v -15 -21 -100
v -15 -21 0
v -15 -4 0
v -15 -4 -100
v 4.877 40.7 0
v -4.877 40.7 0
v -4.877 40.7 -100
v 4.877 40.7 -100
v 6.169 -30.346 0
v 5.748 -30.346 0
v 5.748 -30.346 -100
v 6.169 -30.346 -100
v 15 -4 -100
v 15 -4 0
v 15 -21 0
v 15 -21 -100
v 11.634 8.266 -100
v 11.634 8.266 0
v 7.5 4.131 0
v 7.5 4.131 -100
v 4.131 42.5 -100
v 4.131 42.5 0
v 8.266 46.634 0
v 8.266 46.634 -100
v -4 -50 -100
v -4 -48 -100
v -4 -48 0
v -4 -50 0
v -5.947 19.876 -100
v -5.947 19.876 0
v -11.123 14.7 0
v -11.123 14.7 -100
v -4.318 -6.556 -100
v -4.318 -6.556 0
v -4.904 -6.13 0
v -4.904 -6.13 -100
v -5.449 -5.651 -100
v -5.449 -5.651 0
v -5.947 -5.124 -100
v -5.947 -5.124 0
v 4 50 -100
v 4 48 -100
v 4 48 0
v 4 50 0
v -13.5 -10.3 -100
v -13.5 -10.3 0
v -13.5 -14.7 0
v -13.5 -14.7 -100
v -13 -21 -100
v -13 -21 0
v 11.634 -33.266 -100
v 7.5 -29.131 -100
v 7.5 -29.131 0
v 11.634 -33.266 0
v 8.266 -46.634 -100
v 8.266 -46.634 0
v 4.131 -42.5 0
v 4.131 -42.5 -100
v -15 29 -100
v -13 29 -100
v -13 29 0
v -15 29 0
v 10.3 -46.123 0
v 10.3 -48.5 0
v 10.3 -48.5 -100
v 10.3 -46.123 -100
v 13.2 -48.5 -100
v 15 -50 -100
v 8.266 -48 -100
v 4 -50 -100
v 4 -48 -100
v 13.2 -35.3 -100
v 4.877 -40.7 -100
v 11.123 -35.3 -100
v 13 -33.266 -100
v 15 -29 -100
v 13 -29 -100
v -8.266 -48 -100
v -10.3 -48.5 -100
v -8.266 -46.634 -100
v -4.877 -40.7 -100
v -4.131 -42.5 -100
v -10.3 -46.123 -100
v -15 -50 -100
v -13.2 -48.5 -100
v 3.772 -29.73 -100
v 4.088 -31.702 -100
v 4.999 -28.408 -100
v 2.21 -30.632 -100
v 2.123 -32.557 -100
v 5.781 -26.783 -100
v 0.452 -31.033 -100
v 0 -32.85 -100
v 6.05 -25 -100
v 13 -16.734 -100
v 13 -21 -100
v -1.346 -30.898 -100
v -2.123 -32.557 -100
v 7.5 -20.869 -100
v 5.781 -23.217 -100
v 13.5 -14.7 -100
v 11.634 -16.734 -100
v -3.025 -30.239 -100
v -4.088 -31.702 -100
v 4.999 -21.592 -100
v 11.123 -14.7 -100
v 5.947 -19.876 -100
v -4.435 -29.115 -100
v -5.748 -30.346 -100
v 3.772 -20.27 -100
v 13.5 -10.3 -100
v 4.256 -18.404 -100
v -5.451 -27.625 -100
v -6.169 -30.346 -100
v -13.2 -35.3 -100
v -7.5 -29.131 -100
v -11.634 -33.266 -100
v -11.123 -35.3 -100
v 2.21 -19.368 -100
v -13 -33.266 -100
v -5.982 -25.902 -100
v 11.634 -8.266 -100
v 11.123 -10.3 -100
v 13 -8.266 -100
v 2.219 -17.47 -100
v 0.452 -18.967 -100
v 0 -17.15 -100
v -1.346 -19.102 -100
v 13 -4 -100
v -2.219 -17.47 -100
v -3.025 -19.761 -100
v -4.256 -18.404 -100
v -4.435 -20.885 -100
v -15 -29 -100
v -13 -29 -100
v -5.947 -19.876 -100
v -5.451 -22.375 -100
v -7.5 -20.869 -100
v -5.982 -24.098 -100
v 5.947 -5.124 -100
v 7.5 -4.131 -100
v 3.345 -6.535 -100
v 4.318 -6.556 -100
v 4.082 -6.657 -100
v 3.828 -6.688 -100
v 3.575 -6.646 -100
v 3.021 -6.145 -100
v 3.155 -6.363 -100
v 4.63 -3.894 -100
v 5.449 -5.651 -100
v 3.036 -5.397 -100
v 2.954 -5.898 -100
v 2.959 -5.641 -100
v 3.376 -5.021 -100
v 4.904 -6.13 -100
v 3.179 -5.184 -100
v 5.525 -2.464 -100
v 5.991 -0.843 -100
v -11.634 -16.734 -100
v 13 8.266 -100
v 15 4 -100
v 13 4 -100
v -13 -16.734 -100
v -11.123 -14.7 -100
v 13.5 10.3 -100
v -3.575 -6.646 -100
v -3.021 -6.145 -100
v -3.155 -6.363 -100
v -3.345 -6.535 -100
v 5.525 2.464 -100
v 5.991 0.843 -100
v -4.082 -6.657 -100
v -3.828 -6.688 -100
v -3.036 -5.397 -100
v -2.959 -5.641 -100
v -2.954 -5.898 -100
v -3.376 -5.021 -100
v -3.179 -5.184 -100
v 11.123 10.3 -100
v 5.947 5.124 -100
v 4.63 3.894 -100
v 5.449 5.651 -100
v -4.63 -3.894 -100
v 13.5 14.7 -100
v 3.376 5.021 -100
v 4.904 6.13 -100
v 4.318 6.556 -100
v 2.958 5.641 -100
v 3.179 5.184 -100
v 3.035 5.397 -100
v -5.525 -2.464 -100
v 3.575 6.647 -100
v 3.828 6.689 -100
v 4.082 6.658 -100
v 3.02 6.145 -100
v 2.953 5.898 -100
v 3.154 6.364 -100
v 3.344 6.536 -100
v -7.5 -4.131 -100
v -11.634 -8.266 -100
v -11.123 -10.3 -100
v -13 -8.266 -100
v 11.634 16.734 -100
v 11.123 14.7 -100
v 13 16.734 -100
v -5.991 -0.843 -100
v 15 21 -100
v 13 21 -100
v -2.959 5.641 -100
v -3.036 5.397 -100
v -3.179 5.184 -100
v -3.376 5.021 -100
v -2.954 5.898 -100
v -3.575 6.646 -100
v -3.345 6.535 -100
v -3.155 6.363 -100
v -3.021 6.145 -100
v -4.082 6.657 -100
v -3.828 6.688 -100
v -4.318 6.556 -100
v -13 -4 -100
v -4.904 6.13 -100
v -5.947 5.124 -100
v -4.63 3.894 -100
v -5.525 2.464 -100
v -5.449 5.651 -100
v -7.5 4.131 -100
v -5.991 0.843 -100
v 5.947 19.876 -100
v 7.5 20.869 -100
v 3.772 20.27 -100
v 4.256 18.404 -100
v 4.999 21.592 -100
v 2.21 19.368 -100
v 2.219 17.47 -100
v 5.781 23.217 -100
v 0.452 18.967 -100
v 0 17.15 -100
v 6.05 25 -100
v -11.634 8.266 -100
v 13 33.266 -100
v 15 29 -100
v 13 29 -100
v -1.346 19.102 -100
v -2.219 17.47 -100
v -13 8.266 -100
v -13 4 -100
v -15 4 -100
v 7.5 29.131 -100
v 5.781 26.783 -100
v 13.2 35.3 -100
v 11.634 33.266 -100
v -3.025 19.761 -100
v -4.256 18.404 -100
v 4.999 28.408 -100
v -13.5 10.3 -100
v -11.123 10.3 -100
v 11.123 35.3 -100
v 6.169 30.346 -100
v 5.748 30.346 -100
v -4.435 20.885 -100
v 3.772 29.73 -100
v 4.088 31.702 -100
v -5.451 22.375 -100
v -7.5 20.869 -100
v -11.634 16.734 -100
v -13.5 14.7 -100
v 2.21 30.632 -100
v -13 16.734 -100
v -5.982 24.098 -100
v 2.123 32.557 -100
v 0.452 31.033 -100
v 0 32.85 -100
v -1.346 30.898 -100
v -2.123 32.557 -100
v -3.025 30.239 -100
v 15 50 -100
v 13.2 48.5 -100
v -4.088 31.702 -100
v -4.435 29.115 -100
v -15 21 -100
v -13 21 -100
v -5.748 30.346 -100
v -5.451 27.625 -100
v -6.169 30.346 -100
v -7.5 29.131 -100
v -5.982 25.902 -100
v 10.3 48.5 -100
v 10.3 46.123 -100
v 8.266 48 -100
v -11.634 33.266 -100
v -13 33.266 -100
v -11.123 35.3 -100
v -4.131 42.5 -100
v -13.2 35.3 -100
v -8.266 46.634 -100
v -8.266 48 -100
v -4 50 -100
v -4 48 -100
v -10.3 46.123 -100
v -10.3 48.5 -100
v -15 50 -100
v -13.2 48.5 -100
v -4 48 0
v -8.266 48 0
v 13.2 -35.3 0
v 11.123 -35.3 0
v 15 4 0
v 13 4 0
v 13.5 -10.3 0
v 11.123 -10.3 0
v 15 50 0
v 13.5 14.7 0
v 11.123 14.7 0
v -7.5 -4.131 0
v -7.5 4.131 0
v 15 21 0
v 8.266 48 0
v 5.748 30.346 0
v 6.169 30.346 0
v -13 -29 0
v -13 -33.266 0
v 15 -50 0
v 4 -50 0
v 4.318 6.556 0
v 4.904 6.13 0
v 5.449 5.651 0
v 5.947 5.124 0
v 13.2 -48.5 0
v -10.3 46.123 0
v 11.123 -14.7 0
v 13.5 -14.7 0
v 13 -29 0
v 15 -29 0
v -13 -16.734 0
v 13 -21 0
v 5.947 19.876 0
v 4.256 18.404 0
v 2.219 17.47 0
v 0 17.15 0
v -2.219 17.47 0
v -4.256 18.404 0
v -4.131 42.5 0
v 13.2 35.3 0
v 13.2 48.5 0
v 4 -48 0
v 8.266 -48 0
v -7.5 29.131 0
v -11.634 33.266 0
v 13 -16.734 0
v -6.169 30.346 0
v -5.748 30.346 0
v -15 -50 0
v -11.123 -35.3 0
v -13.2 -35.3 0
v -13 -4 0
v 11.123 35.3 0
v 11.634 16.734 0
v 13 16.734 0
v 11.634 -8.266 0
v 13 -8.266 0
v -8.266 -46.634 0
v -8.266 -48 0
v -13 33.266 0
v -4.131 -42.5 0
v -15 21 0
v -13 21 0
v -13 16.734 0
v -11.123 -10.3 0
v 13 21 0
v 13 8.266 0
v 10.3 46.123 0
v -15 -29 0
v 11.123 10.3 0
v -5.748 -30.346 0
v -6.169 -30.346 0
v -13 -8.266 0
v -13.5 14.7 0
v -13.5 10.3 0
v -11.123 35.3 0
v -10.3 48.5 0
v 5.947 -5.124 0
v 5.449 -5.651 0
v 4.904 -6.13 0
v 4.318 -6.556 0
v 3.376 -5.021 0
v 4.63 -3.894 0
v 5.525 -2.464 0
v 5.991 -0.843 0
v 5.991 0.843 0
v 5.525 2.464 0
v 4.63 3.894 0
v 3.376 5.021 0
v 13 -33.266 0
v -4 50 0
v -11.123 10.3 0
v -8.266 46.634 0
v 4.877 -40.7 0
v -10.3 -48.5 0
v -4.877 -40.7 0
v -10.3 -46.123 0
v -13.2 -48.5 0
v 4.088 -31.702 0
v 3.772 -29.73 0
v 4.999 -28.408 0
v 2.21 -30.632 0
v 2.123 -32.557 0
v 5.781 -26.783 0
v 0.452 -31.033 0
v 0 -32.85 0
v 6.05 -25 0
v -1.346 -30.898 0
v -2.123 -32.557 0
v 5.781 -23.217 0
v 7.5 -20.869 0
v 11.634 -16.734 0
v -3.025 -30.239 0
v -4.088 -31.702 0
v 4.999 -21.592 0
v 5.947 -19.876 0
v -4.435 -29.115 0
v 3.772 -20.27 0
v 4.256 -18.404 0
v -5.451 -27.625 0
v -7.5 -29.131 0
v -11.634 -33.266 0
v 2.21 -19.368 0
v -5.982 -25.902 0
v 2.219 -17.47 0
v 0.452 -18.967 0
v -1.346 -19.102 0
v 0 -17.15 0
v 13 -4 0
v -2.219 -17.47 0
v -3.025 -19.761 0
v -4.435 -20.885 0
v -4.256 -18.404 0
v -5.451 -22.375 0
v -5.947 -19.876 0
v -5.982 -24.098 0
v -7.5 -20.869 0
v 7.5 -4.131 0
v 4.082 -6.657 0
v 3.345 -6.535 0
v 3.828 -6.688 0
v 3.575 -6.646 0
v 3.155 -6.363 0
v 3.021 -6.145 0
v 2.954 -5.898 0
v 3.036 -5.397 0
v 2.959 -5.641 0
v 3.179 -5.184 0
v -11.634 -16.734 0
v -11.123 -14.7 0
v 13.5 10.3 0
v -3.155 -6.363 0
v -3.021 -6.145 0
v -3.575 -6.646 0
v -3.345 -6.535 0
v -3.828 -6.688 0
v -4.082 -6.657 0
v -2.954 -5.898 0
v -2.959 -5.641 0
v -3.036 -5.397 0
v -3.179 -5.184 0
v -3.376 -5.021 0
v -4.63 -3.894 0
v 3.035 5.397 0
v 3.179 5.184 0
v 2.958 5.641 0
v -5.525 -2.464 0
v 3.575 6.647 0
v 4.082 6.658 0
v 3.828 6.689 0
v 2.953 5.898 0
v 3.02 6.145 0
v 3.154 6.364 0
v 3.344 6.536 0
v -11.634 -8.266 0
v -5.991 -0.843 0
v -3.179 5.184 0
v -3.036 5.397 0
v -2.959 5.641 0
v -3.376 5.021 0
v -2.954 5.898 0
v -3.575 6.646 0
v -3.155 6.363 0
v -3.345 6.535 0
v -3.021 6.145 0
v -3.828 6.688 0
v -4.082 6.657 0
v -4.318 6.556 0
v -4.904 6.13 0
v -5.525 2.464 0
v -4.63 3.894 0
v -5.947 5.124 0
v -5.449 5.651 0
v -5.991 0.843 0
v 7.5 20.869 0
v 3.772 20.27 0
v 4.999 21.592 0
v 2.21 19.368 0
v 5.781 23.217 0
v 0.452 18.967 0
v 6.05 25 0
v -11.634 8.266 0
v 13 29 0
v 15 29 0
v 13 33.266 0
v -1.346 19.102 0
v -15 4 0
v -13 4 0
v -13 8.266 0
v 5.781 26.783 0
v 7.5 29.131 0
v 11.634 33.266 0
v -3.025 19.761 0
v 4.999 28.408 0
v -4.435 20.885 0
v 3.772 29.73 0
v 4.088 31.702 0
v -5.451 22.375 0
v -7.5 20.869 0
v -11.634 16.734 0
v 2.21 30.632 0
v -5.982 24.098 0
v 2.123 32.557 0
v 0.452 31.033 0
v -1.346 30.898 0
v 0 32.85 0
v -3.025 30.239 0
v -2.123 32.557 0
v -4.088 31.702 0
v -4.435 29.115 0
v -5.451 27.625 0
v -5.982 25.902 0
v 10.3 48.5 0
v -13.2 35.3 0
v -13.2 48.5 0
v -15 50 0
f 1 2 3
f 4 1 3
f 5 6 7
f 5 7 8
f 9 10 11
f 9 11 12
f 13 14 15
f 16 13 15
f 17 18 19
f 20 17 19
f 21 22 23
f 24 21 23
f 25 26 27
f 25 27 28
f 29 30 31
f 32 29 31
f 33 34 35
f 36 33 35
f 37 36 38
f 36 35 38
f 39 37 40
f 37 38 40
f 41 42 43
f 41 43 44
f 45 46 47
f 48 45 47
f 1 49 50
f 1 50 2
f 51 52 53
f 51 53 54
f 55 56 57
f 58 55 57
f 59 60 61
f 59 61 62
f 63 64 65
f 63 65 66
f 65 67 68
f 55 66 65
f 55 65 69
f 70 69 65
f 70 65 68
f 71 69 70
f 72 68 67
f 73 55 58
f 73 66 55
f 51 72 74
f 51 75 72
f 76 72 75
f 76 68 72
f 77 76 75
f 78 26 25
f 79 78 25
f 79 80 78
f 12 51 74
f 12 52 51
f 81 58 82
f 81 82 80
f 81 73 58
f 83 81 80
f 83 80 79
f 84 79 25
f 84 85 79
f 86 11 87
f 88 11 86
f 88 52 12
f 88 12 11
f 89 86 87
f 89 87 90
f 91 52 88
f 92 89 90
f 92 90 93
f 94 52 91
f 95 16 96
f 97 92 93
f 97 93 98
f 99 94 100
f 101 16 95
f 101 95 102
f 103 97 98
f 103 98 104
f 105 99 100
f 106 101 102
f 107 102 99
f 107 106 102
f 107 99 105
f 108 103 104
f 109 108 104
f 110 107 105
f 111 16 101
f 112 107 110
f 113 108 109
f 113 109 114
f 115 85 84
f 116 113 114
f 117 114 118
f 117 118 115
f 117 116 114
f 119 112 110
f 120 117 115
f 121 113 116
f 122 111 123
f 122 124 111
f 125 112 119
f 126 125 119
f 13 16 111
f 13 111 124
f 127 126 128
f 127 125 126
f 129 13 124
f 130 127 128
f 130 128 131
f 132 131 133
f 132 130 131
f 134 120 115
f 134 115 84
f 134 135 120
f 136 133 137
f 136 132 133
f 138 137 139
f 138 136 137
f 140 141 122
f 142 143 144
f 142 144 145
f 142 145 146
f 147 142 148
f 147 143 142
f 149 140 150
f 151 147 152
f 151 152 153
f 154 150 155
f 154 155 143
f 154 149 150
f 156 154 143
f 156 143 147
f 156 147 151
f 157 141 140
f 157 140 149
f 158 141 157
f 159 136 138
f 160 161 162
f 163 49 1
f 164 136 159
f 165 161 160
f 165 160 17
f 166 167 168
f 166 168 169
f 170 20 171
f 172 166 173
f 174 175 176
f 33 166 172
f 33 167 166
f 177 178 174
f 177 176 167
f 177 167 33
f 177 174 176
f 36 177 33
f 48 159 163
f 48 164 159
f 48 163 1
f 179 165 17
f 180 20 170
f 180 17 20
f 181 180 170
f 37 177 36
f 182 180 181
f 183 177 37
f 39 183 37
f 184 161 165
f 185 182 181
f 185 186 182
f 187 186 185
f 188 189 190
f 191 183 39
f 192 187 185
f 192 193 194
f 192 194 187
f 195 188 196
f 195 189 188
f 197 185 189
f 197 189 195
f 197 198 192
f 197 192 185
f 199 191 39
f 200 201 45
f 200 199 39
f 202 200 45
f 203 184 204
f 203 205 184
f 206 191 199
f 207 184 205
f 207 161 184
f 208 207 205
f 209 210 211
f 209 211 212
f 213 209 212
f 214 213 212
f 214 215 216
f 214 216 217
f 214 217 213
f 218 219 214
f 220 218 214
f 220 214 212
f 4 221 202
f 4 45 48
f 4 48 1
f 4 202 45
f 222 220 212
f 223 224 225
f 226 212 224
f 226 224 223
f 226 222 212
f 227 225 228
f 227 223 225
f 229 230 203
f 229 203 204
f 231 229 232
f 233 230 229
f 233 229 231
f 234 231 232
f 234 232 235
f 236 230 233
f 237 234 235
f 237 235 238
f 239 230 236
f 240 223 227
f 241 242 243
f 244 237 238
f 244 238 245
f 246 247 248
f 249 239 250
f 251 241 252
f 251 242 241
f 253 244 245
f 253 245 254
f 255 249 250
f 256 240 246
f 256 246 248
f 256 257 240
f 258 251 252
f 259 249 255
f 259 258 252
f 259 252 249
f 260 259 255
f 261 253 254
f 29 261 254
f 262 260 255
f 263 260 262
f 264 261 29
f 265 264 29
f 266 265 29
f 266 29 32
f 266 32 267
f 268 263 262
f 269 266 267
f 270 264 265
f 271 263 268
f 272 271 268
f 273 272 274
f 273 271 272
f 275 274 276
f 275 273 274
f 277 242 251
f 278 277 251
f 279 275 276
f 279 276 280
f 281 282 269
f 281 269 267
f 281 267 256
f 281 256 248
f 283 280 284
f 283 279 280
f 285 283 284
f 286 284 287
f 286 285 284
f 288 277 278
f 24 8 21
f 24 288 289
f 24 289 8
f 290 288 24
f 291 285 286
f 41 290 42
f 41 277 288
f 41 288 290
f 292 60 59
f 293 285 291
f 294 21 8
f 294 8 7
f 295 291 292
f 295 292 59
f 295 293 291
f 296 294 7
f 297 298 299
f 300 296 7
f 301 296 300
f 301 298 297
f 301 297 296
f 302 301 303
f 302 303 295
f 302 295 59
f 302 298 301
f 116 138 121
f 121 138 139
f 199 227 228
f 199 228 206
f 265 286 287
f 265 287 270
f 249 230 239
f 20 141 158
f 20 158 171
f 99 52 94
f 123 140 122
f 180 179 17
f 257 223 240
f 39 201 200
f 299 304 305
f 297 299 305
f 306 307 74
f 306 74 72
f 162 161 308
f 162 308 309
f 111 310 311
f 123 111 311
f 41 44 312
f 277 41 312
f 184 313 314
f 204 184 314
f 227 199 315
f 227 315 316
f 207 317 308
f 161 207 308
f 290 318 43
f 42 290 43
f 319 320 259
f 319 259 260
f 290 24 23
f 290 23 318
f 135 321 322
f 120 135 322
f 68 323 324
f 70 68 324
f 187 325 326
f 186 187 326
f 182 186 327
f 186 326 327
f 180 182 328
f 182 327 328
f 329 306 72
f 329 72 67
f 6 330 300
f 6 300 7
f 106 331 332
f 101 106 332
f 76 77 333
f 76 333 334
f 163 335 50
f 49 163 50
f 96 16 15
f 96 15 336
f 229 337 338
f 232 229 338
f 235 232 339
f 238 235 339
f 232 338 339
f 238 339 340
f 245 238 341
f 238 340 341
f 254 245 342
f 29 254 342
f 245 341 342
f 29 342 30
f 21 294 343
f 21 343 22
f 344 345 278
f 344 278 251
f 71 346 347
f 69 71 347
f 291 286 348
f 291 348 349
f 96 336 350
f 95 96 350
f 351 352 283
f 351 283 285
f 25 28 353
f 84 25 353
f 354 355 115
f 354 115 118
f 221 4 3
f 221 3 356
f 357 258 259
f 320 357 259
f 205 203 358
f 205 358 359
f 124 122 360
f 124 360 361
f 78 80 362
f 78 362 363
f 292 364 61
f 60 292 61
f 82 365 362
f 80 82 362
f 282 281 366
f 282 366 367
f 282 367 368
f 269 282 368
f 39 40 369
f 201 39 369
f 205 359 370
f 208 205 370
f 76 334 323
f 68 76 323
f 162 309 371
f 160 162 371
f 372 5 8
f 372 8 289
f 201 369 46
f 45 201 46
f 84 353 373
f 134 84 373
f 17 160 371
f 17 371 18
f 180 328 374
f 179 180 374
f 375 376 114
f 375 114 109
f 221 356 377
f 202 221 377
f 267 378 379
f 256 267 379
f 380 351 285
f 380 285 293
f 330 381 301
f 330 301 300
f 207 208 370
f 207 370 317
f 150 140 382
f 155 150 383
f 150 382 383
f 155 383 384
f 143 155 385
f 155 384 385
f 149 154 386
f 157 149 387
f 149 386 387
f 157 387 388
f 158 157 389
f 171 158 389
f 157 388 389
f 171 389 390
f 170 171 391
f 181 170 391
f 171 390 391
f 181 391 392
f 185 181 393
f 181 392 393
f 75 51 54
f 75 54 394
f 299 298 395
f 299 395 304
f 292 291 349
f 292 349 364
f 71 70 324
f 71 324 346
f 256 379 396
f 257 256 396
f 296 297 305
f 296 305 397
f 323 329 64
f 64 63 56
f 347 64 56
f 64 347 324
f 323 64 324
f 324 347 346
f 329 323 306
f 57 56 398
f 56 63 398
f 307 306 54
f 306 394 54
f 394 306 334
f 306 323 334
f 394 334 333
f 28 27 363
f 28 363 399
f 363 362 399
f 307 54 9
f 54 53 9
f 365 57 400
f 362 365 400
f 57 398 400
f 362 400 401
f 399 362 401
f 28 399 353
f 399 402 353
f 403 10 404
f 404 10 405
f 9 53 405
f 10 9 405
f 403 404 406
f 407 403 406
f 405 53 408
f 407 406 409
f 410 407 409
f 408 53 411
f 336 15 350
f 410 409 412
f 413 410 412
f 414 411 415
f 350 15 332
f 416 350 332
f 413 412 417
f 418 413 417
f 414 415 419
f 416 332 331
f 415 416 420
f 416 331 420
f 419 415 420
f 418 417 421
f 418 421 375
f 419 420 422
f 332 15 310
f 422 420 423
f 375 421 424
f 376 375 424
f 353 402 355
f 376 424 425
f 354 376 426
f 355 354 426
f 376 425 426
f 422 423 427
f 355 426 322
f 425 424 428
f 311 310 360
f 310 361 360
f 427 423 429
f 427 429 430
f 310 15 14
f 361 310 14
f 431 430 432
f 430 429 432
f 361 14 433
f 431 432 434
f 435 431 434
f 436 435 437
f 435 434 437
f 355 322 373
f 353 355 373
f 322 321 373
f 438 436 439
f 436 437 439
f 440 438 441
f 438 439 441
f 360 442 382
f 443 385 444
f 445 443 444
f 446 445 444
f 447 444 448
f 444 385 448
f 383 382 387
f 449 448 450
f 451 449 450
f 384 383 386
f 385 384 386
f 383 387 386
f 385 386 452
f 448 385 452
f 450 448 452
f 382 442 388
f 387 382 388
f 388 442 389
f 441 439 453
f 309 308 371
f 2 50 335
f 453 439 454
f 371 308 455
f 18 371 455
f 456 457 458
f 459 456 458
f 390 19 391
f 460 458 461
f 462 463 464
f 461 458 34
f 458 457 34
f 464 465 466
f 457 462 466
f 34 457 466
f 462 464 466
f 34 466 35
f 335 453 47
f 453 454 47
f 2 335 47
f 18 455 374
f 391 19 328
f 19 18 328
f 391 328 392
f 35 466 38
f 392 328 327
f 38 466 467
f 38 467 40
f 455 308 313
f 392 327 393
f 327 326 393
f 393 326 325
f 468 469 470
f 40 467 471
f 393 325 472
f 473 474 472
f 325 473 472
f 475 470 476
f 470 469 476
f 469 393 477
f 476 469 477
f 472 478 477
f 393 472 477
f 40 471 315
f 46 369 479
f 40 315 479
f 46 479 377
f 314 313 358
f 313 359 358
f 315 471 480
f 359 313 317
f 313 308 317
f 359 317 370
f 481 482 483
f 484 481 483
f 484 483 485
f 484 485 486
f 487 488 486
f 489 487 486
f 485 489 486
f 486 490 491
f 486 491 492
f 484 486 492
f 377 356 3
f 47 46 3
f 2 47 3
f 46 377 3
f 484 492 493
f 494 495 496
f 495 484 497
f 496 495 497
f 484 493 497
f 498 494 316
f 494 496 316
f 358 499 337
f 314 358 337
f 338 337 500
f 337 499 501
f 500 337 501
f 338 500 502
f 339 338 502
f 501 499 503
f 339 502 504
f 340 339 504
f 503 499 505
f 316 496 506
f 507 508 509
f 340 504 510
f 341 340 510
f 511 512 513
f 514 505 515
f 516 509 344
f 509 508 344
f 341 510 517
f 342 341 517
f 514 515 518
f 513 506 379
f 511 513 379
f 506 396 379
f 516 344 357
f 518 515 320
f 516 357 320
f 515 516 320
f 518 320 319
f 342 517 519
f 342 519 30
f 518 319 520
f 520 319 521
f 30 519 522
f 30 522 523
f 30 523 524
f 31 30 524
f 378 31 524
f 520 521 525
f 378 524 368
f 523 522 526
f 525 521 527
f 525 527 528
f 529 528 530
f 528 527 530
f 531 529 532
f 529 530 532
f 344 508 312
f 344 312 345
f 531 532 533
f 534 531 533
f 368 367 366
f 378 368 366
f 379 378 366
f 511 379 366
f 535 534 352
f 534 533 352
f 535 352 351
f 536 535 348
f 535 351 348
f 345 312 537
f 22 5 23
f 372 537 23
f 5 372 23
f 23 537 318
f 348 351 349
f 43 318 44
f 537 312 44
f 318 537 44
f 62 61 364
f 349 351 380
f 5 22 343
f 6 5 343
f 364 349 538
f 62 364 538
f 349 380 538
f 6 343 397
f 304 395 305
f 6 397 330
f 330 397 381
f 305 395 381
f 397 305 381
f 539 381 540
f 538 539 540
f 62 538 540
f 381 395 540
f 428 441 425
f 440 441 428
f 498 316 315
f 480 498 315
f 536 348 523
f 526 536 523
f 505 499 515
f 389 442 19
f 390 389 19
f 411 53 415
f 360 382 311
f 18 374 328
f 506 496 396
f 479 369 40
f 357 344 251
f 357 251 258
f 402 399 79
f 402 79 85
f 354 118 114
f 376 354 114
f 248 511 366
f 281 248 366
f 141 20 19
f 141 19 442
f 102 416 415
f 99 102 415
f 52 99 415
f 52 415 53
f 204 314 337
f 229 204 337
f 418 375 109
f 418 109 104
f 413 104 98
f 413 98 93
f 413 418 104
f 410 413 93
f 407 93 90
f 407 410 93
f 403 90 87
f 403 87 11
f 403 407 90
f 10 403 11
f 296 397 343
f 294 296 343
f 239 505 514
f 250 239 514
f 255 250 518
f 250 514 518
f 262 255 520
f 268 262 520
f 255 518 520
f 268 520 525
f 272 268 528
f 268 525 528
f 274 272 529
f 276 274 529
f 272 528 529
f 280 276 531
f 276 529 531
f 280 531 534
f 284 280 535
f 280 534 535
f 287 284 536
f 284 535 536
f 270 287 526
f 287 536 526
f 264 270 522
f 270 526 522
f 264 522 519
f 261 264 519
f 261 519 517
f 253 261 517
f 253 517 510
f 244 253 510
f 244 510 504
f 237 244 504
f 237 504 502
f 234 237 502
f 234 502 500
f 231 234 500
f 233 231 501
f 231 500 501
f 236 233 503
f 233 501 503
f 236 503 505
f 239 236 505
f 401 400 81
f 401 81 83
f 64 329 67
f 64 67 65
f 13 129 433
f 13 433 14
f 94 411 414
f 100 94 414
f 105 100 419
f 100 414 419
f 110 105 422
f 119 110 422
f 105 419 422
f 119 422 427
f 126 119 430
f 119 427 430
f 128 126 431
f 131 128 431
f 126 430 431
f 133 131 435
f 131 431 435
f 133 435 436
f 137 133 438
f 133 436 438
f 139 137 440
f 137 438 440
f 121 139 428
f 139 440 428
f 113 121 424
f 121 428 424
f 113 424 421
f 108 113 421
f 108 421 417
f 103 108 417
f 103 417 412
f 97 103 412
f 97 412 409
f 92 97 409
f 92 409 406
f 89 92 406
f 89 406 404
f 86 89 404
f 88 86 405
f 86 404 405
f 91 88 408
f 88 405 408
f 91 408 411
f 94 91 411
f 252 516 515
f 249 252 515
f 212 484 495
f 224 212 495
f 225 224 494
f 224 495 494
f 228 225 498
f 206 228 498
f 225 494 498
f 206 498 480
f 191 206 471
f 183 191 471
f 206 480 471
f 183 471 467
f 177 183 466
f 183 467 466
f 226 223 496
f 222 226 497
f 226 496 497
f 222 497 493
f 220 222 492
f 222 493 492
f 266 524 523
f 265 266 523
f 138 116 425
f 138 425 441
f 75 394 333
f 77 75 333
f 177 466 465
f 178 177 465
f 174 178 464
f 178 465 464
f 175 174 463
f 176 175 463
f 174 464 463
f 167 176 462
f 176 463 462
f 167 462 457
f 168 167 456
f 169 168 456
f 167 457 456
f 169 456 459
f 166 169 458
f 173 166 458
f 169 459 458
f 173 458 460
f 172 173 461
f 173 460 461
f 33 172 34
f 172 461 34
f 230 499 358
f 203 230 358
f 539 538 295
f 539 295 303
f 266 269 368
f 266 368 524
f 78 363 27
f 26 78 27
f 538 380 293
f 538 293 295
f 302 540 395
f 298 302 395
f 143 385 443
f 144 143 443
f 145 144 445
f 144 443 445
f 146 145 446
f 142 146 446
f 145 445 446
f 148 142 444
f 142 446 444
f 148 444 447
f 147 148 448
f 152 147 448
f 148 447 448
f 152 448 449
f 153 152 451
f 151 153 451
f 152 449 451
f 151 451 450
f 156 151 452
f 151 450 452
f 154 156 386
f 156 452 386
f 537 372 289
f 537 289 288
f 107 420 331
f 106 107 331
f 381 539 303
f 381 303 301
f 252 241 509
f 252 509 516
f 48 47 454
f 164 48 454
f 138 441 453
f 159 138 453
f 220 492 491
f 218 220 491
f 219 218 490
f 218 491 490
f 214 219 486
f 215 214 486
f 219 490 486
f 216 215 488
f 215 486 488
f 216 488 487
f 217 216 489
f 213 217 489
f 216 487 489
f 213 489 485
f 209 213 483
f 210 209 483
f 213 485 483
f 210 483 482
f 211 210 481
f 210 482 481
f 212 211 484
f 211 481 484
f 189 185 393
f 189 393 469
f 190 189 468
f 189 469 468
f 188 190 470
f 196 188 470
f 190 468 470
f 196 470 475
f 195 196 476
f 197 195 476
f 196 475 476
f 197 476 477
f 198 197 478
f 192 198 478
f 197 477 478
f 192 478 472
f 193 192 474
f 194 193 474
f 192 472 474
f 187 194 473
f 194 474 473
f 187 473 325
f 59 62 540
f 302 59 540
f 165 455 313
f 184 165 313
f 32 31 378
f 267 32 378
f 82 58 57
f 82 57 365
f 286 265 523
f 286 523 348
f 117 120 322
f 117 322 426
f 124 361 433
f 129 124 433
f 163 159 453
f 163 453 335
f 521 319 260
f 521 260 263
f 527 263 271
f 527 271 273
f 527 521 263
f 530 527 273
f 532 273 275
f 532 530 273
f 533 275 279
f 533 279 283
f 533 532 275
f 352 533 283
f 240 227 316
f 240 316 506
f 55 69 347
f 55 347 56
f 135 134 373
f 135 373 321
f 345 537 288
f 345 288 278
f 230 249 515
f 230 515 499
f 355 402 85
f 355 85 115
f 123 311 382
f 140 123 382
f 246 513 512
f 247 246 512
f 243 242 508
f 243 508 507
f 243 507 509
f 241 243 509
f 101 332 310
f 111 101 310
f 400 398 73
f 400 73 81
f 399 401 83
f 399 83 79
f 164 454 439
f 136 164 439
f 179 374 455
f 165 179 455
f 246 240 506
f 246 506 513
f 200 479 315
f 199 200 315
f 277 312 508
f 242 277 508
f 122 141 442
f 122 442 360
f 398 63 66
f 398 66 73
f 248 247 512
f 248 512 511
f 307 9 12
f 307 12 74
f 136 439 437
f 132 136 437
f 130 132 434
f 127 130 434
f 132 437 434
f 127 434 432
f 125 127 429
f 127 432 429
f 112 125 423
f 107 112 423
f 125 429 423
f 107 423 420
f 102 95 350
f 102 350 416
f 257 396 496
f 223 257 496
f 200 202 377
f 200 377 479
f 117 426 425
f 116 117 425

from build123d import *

# Parameters (mm, degrees)
MB1_2_R        = 6.049999109
MB1_2_R_2      = 6.050000891
EXTRUDE1_DEPTH = 100


with BuildPart() as part:
    # MB1-2 → Extrude1 (new body)
    with BuildSketch(Plane.XY):
        Polygon((-13, -33.265685), (-11.634315, -33.265685), (-7.5, -29.131371165), (-7.5, -20.868628835), (-11.634315, -16.734315), (-13, -16.734315), (-13, -21), (-15, -21), (-15, -4), (-13, -4), (-13, -8.265685), (-11.634315, -8.265685), (-7.5, -4.131371165), (-7.5, 4.131371165), (-11.634315, 8.265685), (-13, 8.265685), (-13, 4), (-15, 4), (-15, 21), (-13, 21), (-13, 16.734315), (-11.634315, 16.734315), (-7.5, 20.868628835), (-7.5, 29.131371165), (-11.634315, 33.265685), (-13, 33.265685), (-13, 29), (-15, 29), (-15, 50), (-4, 50), (-4, 48), (-8.265685, 48), (-8.265685, 46.634315), (-4.131371165, 42.5), (4.131371165, 42.5), (8.265685, 46.634315), (8.265685, 48), (4, 48), (4, 50), (15, 50), (15, 29), (13, 29), (13, 33.265685), (11.634315, 33.265685), (7.5, 29.131371165), (7.5, 20.868628835), (11.634315, 16.734315), (13, 16.734315), (13, 21), (15, 21), (15, 4), (13, 4), (13, 8.265685), (11.634315, 8.265685), (7.5, 4.131371165), (7.5, -4.131371165), (11.634315, -8.265685), (13, -8.265685), (13, -4), (15, -4), (15, -21), (13, -21), (13, -16.734315), (11.634315, -16.734315), (7.5, -20.868628835), (7.5, -29.131371165), (11.634315, -33.265685), (13, -33.265685), (13, -29), (15, -29), (15, -50), (4, -50), (4, -48), (8.265685, -48), (8.265685, -46.634315), (4.131371165, -42.5), (-4.131371165, -42.5), (-8.265685, -46.634315), (-8.265685, -48), (-4, -48), (-4, -50), (-15, -50), (-15, -29), (-13, -29), align=None)
        with Locations((0, -24.999996952)):
            Circle(MB1_2_R, mode=Mode.SUBTRACT)
        with Locations((0, 24.999996952)):
            Circle(MB1_2_R_2, mode=Mode.SUBTRACT)
        with BuildLine():
            Line((5.74819726, -30.346094347), (6.169137939, -30.346093939))
            Line((6.169137939, -30.346093939), (11.123044, -35.3))
            Line((11.123044, -35.3), (13.2, -35.3))
            Line((13.2, -35.3), (13.2, -48.5))
            Line((13.2, -48.5), (10.3, -48.5))
            Line((10.3, -48.5), (10.3, -46.123043785))
            Line((10.3, -46.123043785), (4.876954686, -40.7))
            Line((4.876954686, -40.7), (-4.876954686, -40.7))
            Line((-4.876954686, -40.7), (-10.3, -46.123043785))
            Line((-10.3, -46.123043785), (-10.3, -48.5))
            Line((-10.3, -48.5), (-13.2, -48.5))
            Line((-13.2, -48.5), (-13.2, -35.3))
            Line((-13.2, -35.3), (-11.123044, -35.3))
            Line((-11.123044, -35.3), (-6.169138347, -30.346094347))
            Line((-6.169138347, -30.346094347), (-5.74819688, -30.346094756))
            ThreePointArc((-5.74819688, -30.346094756), (2.79e-07, -32.849998806), (5.74819726, -30.346094347))
        make_face(mode=Mode.SUBTRACT)
        with BuildLine():
            Line((6.169138347, 30.346094347), (5.74819688, 30.346094756))
            ThreePointArc((5.74819688, 30.346094756), (-2.79e-07, 32.849998806), (-5.74819726, 30.346094347))
            Line((-5.74819726, 30.346094347), (-6.169137939, 30.346093939))
            Line((-6.169137939, 30.346093939), (-11.123044, 35.3))
            Line((-11.123044, 35.3), (-13.2, 35.3))
            Line((-13.2, 35.3), (-13.2, 48.5))
            Line((-13.2, 48.5), (-10.3, 48.5))
            Line((-10.3, 48.5), (-10.3, 46.123043785))
            Line((-10.3, 46.123043785), (-4.876954686, 40.7))
            Line((-4.876954686, 40.7), (4.876954686, 40.7))
            Line((4.876954686, 40.7), (10.3, 46.123043785))
            Line((10.3, 46.123043785), (10.3, 48.5))
            Line((10.3, 48.5), (13.2, 48.5))
            Line((13.2, 48.5), (13.2, 35.3))
            Line((13.2, 35.3), (11.123044, 35.3))
            Line((11.123044, 35.3), (6.169138347, 30.346094347))
        make_face(mode=Mode.SUBTRACT)
        with BuildLine():
            Line((-11.123044, -14.7), (-5.947034494, -19.876009506))
            ThreePointArc((-5.947034494, -19.876009506), (0, -17.149999078), (5.947034494, -19.876009506))
            Line((5.947034494, -19.876009506), (11.123044, -14.7))
            Line((11.123044, -14.7), (13.5, -14.7))
            Line((13.5, -14.7), (13.5, -10.3))
            Line((13.5, -10.3), (11.123044, -10.3))
            Line((11.123044, -10.3), (5.947034535, -5.123990535))
            ThreePointArc((5.947034535, -5.123990535), (5.181974313, -5.896578485), (4.3175, -6.556043))
            ThreePointArc((4.3175, -6.556043), (3.079734534, -6.258736768), (3.375725, -5.020656))
            ThreePointArc((3.375725, -5.020656), (6.050002522, 0), (3.375725, 5.020656))
            ThreePointArc((3.375725, 5.020656), (3.078919, 6.259237), (4.3175, 6.556043))
            ThreePointArc((4.3175, 6.556043), (5.181974313, 5.896578485), (5.947034535, 5.123990535))
            Line((5.947034535, 5.123990535), (11.123044, 10.3))
            Line((11.123044, 10.3), (13.5, 10.3))
            Line((13.5, 10.3), (13.5, 14.7))
            Line((13.5, 14.7), (11.123044, 14.7))
            Line((11.123044, 14.7), (5.947034494, 19.876009506))
            ThreePointArc((5.947034494, 19.876009506), (0, 17.149999078), (-5.947034494, 19.876009506))
            Line((-5.947034494, 19.876009506), (-11.123044, 14.7))
            Line((-11.123044, 14.7), (-13.5, 14.7))
            Line((-13.5, 14.7), (-13.5, 10.3))
            Line((-13.5, 10.3), (-11.123044, 10.3))
            Line((-11.123044, 10.3), (-5.947034535, 5.123990535))
            ThreePointArc((-5.947034535, 5.123990535), (-5.181974313, 5.896578485), (-4.3175, 6.556043))
            ThreePointArc((-4.3175, 6.556043), (-3.079734534, 6.258736768), (-3.375725, 5.020656))
            ThreePointArc((-3.375725, 5.020656), (-6.049998461, 0), (-3.375725, -5.020656))
            ThreePointArc((-3.375725, -5.020656), (-3.079734534, -6.258736768), (-4.3175, -6.556043))
            ThreePointArc((-4.3175, -6.556043), (-5.181974313, -5.896578485), (-5.947034535, -5.123990535))
            Line((-5.947034535, -5.123990535), (-11.123044, -10.3))
            Line((-11.123044, -10.3), (-13.5, -10.3))
            Line((-13.5, -10.3), (-13.5, -14.7))
            Line((-13.5, -14.7), (-11.123044, -14.7))
        make_face(mode=Mode.SUBTRACT)
    extrude(amount=-EXTRUDE1_DEPTH)


solid = part.part
